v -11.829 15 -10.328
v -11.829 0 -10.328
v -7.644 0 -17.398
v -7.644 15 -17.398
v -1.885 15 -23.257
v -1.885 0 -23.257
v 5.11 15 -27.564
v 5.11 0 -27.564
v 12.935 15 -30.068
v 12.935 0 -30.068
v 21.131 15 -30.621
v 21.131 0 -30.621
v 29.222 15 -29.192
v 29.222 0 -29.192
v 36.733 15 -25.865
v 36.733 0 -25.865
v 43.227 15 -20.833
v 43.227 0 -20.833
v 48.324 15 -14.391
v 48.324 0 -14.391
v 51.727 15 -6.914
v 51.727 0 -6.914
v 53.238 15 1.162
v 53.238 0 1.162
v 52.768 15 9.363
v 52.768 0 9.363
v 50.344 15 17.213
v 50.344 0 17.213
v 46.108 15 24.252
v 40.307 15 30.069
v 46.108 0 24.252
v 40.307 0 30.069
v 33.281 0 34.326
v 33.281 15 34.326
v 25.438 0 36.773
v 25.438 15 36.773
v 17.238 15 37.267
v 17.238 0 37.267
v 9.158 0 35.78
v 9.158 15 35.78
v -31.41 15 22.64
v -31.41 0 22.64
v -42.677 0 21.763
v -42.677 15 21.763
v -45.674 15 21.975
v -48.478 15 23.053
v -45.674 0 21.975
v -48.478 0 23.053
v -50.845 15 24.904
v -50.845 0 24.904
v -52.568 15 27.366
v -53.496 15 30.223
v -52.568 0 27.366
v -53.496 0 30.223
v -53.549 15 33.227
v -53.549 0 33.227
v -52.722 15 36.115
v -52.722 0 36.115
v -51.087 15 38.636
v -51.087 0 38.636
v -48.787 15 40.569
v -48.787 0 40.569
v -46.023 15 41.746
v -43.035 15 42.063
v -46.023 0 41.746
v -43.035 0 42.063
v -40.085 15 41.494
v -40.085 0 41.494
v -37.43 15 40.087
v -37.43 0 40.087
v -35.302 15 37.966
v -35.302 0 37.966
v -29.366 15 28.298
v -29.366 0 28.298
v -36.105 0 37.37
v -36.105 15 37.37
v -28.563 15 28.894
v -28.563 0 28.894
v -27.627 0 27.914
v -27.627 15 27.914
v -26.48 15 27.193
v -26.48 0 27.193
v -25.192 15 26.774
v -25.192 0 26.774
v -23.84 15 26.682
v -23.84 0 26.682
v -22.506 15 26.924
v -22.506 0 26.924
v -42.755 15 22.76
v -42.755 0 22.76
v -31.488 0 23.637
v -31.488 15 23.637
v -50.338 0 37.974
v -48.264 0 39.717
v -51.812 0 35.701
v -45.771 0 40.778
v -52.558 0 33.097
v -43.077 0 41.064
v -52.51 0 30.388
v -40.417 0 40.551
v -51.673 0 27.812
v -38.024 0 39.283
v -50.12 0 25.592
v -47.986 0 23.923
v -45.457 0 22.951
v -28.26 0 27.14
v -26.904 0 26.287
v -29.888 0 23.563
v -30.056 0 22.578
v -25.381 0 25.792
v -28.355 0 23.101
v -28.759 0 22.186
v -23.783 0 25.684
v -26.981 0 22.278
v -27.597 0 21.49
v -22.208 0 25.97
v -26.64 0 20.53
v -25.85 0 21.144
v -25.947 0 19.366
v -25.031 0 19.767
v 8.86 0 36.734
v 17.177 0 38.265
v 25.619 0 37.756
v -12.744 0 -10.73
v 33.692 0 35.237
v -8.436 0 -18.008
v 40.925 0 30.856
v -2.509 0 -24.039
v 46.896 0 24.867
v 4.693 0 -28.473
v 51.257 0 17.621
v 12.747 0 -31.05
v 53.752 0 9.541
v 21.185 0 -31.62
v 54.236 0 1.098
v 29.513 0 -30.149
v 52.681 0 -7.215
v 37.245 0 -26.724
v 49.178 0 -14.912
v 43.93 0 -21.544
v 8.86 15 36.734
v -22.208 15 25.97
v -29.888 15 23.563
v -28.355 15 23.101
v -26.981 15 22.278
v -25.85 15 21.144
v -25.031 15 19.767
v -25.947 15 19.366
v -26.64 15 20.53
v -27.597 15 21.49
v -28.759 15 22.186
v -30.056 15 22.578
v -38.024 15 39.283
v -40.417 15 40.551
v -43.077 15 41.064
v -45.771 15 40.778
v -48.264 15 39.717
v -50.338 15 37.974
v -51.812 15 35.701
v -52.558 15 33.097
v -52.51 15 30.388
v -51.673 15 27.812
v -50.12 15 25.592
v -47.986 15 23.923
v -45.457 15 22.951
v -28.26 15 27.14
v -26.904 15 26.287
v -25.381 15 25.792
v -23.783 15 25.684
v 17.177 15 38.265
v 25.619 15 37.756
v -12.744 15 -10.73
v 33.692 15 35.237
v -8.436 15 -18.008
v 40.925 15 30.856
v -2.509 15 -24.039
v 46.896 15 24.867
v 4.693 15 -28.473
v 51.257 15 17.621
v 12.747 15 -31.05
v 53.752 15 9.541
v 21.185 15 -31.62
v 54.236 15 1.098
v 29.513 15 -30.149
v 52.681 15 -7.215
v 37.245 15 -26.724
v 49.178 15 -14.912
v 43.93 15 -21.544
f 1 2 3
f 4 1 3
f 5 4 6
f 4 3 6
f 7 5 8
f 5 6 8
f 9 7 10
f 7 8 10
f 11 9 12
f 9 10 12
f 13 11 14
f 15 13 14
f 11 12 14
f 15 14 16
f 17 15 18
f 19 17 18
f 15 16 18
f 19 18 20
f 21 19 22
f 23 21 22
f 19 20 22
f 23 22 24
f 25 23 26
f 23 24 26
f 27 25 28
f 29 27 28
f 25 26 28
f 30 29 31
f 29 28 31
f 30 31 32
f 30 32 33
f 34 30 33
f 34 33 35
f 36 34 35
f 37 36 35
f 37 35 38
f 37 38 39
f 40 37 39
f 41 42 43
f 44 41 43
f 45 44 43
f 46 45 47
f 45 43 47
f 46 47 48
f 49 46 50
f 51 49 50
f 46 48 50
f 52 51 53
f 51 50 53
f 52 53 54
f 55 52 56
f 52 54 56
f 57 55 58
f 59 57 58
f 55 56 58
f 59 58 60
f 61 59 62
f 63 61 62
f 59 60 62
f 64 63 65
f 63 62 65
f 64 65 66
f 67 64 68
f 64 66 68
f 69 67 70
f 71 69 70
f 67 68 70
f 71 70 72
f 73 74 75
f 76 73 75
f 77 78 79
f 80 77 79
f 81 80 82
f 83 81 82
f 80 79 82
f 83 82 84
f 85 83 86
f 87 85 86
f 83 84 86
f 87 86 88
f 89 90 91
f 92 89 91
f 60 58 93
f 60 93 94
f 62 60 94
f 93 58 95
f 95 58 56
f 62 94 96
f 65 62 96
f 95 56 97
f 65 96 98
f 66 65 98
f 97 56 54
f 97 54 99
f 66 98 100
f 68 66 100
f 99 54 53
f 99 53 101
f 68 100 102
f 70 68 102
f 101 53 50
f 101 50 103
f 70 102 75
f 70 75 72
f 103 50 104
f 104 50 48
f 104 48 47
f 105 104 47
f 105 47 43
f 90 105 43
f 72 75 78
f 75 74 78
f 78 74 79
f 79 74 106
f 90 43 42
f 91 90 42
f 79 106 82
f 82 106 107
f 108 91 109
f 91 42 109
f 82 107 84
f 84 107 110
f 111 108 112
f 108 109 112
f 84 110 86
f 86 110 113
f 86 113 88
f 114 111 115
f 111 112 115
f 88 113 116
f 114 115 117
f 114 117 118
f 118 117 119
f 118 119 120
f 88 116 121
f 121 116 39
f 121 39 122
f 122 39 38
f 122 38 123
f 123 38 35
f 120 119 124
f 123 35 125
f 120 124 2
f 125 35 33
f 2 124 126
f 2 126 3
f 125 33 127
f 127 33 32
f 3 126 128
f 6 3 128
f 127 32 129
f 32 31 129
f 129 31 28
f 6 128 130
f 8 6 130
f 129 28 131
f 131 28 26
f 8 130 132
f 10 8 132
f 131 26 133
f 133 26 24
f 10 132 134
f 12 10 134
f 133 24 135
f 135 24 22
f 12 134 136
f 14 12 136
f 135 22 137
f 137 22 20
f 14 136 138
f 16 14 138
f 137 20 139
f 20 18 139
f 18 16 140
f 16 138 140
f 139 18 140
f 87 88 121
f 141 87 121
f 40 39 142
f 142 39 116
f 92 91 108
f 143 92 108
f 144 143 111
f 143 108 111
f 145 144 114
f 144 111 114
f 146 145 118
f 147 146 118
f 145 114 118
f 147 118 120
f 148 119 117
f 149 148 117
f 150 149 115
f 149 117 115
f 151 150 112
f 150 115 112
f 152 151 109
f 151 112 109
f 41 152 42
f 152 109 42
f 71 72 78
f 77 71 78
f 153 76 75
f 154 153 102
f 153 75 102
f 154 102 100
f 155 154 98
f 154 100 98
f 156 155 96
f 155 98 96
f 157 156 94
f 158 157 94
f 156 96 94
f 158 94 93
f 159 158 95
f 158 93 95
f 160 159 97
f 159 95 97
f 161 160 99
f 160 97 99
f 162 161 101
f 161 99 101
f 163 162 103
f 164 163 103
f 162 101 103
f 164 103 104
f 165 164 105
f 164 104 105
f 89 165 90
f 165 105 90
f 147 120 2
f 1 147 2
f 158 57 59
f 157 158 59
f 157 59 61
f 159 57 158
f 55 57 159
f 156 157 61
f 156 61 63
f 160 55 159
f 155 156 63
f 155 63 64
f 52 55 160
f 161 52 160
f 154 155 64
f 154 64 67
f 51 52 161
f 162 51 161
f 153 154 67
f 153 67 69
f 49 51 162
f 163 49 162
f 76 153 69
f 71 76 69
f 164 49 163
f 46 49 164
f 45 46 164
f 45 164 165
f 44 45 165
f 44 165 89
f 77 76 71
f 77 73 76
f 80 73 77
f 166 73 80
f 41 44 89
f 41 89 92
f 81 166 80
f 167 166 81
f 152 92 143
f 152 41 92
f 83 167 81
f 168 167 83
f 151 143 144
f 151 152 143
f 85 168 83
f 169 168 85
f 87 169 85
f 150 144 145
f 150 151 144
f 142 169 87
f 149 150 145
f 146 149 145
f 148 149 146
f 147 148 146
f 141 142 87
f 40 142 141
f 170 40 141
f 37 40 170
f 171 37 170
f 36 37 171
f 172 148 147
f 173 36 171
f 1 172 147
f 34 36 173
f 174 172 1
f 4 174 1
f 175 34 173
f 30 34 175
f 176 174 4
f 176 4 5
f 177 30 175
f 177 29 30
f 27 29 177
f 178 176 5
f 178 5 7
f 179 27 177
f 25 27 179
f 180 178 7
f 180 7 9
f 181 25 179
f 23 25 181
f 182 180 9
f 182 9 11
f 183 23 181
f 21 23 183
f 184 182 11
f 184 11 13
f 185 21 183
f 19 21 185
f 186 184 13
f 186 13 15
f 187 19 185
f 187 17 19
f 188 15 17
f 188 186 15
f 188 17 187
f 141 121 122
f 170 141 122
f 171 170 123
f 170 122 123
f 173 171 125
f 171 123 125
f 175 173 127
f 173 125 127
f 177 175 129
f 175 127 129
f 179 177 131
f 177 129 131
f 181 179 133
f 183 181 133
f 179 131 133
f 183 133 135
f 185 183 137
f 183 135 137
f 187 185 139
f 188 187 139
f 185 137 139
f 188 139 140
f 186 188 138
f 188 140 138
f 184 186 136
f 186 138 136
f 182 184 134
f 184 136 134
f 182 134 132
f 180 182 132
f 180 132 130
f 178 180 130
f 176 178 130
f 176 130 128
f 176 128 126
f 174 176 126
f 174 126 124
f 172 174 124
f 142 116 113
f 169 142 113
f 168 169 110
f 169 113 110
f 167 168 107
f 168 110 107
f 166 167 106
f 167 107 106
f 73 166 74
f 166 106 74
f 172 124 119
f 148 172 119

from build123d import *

# Parameters (mm, degrees)
BOSS_EXTRUDE1_DEPTH = 15


with BuildPart() as part:
    # Sketch1 → Boss-Extrude1 (new body)
    with BuildSketch(Plane(origin=(0, 0, 0), x_dir=(1, 0, 0), z_dir=(0, 1, 0))):
        with BuildLine():
            ThreePointArc((8.85981646, -36.734366282), (51.162558776, 11.169517142), (-12.744491466, 10.7302178))
            Line((-12.744491466, 10.7302178), (-25.946747838, -19.365677712))
            ThreePointArc((-25.946747838, -19.365677712), (-28.156287224, -21.87397008), (-31.410106737, -22.639641991))
            Line((-31.410106737, -22.639641991), (-42.677134679, -21.762954271))
            ThreePointArc((-42.677134679, -21.762954271), (-52.722336819, -36.115449465), (-35.30183314, -37.966464293))
            Line((-35.30183314, -37.966464293), (-28.563233928, -28.894210954))
            ThreePointArc((-28.563233928, -28.894210954), (-25.848867686, -26.943362215), (-22.506228219, -26.924486508))
            Line((-22.506228219, -26.924486508), (8.85981646, -36.734366282))
        make_face()
        with BuildLine():
            Line((-42.754710221, -22.759940748), (-31.487682279, -23.636628468))
            ThreePointArc((-31.487682279, -23.636628468), (-27.642259218, -22.731743482), (-25.030985399, -19.767397956))
            Line((-25.030985399, -19.767397956), (-11.828729026, 10.328497556))
            ThreePointArc((-11.828729026, 10.328497556), (50.252405495, 10.755245488), (9.158312959, -35.779955553))
            Line((9.158312959, -35.779955553), (-22.20773172, -25.970075778))
            ThreePointArc((-22.20773172, -25.970075778), (-26.158123817, -25.992383432), (-29.366011194, -28.297931942))
            Line((-29.366011194, -28.297931942), (-36.104610407, -37.370185281))
            ThreePointArc((-36.104610407, -37.370185281), (-51.812183538, -35.701177811), (-42.754710221, -22.759940748))
        make_face(mode=Mode.SUBTRACT)
    extrude(amount=BOSS_EXTRUDE1_DEPTH)


solid = part.part
